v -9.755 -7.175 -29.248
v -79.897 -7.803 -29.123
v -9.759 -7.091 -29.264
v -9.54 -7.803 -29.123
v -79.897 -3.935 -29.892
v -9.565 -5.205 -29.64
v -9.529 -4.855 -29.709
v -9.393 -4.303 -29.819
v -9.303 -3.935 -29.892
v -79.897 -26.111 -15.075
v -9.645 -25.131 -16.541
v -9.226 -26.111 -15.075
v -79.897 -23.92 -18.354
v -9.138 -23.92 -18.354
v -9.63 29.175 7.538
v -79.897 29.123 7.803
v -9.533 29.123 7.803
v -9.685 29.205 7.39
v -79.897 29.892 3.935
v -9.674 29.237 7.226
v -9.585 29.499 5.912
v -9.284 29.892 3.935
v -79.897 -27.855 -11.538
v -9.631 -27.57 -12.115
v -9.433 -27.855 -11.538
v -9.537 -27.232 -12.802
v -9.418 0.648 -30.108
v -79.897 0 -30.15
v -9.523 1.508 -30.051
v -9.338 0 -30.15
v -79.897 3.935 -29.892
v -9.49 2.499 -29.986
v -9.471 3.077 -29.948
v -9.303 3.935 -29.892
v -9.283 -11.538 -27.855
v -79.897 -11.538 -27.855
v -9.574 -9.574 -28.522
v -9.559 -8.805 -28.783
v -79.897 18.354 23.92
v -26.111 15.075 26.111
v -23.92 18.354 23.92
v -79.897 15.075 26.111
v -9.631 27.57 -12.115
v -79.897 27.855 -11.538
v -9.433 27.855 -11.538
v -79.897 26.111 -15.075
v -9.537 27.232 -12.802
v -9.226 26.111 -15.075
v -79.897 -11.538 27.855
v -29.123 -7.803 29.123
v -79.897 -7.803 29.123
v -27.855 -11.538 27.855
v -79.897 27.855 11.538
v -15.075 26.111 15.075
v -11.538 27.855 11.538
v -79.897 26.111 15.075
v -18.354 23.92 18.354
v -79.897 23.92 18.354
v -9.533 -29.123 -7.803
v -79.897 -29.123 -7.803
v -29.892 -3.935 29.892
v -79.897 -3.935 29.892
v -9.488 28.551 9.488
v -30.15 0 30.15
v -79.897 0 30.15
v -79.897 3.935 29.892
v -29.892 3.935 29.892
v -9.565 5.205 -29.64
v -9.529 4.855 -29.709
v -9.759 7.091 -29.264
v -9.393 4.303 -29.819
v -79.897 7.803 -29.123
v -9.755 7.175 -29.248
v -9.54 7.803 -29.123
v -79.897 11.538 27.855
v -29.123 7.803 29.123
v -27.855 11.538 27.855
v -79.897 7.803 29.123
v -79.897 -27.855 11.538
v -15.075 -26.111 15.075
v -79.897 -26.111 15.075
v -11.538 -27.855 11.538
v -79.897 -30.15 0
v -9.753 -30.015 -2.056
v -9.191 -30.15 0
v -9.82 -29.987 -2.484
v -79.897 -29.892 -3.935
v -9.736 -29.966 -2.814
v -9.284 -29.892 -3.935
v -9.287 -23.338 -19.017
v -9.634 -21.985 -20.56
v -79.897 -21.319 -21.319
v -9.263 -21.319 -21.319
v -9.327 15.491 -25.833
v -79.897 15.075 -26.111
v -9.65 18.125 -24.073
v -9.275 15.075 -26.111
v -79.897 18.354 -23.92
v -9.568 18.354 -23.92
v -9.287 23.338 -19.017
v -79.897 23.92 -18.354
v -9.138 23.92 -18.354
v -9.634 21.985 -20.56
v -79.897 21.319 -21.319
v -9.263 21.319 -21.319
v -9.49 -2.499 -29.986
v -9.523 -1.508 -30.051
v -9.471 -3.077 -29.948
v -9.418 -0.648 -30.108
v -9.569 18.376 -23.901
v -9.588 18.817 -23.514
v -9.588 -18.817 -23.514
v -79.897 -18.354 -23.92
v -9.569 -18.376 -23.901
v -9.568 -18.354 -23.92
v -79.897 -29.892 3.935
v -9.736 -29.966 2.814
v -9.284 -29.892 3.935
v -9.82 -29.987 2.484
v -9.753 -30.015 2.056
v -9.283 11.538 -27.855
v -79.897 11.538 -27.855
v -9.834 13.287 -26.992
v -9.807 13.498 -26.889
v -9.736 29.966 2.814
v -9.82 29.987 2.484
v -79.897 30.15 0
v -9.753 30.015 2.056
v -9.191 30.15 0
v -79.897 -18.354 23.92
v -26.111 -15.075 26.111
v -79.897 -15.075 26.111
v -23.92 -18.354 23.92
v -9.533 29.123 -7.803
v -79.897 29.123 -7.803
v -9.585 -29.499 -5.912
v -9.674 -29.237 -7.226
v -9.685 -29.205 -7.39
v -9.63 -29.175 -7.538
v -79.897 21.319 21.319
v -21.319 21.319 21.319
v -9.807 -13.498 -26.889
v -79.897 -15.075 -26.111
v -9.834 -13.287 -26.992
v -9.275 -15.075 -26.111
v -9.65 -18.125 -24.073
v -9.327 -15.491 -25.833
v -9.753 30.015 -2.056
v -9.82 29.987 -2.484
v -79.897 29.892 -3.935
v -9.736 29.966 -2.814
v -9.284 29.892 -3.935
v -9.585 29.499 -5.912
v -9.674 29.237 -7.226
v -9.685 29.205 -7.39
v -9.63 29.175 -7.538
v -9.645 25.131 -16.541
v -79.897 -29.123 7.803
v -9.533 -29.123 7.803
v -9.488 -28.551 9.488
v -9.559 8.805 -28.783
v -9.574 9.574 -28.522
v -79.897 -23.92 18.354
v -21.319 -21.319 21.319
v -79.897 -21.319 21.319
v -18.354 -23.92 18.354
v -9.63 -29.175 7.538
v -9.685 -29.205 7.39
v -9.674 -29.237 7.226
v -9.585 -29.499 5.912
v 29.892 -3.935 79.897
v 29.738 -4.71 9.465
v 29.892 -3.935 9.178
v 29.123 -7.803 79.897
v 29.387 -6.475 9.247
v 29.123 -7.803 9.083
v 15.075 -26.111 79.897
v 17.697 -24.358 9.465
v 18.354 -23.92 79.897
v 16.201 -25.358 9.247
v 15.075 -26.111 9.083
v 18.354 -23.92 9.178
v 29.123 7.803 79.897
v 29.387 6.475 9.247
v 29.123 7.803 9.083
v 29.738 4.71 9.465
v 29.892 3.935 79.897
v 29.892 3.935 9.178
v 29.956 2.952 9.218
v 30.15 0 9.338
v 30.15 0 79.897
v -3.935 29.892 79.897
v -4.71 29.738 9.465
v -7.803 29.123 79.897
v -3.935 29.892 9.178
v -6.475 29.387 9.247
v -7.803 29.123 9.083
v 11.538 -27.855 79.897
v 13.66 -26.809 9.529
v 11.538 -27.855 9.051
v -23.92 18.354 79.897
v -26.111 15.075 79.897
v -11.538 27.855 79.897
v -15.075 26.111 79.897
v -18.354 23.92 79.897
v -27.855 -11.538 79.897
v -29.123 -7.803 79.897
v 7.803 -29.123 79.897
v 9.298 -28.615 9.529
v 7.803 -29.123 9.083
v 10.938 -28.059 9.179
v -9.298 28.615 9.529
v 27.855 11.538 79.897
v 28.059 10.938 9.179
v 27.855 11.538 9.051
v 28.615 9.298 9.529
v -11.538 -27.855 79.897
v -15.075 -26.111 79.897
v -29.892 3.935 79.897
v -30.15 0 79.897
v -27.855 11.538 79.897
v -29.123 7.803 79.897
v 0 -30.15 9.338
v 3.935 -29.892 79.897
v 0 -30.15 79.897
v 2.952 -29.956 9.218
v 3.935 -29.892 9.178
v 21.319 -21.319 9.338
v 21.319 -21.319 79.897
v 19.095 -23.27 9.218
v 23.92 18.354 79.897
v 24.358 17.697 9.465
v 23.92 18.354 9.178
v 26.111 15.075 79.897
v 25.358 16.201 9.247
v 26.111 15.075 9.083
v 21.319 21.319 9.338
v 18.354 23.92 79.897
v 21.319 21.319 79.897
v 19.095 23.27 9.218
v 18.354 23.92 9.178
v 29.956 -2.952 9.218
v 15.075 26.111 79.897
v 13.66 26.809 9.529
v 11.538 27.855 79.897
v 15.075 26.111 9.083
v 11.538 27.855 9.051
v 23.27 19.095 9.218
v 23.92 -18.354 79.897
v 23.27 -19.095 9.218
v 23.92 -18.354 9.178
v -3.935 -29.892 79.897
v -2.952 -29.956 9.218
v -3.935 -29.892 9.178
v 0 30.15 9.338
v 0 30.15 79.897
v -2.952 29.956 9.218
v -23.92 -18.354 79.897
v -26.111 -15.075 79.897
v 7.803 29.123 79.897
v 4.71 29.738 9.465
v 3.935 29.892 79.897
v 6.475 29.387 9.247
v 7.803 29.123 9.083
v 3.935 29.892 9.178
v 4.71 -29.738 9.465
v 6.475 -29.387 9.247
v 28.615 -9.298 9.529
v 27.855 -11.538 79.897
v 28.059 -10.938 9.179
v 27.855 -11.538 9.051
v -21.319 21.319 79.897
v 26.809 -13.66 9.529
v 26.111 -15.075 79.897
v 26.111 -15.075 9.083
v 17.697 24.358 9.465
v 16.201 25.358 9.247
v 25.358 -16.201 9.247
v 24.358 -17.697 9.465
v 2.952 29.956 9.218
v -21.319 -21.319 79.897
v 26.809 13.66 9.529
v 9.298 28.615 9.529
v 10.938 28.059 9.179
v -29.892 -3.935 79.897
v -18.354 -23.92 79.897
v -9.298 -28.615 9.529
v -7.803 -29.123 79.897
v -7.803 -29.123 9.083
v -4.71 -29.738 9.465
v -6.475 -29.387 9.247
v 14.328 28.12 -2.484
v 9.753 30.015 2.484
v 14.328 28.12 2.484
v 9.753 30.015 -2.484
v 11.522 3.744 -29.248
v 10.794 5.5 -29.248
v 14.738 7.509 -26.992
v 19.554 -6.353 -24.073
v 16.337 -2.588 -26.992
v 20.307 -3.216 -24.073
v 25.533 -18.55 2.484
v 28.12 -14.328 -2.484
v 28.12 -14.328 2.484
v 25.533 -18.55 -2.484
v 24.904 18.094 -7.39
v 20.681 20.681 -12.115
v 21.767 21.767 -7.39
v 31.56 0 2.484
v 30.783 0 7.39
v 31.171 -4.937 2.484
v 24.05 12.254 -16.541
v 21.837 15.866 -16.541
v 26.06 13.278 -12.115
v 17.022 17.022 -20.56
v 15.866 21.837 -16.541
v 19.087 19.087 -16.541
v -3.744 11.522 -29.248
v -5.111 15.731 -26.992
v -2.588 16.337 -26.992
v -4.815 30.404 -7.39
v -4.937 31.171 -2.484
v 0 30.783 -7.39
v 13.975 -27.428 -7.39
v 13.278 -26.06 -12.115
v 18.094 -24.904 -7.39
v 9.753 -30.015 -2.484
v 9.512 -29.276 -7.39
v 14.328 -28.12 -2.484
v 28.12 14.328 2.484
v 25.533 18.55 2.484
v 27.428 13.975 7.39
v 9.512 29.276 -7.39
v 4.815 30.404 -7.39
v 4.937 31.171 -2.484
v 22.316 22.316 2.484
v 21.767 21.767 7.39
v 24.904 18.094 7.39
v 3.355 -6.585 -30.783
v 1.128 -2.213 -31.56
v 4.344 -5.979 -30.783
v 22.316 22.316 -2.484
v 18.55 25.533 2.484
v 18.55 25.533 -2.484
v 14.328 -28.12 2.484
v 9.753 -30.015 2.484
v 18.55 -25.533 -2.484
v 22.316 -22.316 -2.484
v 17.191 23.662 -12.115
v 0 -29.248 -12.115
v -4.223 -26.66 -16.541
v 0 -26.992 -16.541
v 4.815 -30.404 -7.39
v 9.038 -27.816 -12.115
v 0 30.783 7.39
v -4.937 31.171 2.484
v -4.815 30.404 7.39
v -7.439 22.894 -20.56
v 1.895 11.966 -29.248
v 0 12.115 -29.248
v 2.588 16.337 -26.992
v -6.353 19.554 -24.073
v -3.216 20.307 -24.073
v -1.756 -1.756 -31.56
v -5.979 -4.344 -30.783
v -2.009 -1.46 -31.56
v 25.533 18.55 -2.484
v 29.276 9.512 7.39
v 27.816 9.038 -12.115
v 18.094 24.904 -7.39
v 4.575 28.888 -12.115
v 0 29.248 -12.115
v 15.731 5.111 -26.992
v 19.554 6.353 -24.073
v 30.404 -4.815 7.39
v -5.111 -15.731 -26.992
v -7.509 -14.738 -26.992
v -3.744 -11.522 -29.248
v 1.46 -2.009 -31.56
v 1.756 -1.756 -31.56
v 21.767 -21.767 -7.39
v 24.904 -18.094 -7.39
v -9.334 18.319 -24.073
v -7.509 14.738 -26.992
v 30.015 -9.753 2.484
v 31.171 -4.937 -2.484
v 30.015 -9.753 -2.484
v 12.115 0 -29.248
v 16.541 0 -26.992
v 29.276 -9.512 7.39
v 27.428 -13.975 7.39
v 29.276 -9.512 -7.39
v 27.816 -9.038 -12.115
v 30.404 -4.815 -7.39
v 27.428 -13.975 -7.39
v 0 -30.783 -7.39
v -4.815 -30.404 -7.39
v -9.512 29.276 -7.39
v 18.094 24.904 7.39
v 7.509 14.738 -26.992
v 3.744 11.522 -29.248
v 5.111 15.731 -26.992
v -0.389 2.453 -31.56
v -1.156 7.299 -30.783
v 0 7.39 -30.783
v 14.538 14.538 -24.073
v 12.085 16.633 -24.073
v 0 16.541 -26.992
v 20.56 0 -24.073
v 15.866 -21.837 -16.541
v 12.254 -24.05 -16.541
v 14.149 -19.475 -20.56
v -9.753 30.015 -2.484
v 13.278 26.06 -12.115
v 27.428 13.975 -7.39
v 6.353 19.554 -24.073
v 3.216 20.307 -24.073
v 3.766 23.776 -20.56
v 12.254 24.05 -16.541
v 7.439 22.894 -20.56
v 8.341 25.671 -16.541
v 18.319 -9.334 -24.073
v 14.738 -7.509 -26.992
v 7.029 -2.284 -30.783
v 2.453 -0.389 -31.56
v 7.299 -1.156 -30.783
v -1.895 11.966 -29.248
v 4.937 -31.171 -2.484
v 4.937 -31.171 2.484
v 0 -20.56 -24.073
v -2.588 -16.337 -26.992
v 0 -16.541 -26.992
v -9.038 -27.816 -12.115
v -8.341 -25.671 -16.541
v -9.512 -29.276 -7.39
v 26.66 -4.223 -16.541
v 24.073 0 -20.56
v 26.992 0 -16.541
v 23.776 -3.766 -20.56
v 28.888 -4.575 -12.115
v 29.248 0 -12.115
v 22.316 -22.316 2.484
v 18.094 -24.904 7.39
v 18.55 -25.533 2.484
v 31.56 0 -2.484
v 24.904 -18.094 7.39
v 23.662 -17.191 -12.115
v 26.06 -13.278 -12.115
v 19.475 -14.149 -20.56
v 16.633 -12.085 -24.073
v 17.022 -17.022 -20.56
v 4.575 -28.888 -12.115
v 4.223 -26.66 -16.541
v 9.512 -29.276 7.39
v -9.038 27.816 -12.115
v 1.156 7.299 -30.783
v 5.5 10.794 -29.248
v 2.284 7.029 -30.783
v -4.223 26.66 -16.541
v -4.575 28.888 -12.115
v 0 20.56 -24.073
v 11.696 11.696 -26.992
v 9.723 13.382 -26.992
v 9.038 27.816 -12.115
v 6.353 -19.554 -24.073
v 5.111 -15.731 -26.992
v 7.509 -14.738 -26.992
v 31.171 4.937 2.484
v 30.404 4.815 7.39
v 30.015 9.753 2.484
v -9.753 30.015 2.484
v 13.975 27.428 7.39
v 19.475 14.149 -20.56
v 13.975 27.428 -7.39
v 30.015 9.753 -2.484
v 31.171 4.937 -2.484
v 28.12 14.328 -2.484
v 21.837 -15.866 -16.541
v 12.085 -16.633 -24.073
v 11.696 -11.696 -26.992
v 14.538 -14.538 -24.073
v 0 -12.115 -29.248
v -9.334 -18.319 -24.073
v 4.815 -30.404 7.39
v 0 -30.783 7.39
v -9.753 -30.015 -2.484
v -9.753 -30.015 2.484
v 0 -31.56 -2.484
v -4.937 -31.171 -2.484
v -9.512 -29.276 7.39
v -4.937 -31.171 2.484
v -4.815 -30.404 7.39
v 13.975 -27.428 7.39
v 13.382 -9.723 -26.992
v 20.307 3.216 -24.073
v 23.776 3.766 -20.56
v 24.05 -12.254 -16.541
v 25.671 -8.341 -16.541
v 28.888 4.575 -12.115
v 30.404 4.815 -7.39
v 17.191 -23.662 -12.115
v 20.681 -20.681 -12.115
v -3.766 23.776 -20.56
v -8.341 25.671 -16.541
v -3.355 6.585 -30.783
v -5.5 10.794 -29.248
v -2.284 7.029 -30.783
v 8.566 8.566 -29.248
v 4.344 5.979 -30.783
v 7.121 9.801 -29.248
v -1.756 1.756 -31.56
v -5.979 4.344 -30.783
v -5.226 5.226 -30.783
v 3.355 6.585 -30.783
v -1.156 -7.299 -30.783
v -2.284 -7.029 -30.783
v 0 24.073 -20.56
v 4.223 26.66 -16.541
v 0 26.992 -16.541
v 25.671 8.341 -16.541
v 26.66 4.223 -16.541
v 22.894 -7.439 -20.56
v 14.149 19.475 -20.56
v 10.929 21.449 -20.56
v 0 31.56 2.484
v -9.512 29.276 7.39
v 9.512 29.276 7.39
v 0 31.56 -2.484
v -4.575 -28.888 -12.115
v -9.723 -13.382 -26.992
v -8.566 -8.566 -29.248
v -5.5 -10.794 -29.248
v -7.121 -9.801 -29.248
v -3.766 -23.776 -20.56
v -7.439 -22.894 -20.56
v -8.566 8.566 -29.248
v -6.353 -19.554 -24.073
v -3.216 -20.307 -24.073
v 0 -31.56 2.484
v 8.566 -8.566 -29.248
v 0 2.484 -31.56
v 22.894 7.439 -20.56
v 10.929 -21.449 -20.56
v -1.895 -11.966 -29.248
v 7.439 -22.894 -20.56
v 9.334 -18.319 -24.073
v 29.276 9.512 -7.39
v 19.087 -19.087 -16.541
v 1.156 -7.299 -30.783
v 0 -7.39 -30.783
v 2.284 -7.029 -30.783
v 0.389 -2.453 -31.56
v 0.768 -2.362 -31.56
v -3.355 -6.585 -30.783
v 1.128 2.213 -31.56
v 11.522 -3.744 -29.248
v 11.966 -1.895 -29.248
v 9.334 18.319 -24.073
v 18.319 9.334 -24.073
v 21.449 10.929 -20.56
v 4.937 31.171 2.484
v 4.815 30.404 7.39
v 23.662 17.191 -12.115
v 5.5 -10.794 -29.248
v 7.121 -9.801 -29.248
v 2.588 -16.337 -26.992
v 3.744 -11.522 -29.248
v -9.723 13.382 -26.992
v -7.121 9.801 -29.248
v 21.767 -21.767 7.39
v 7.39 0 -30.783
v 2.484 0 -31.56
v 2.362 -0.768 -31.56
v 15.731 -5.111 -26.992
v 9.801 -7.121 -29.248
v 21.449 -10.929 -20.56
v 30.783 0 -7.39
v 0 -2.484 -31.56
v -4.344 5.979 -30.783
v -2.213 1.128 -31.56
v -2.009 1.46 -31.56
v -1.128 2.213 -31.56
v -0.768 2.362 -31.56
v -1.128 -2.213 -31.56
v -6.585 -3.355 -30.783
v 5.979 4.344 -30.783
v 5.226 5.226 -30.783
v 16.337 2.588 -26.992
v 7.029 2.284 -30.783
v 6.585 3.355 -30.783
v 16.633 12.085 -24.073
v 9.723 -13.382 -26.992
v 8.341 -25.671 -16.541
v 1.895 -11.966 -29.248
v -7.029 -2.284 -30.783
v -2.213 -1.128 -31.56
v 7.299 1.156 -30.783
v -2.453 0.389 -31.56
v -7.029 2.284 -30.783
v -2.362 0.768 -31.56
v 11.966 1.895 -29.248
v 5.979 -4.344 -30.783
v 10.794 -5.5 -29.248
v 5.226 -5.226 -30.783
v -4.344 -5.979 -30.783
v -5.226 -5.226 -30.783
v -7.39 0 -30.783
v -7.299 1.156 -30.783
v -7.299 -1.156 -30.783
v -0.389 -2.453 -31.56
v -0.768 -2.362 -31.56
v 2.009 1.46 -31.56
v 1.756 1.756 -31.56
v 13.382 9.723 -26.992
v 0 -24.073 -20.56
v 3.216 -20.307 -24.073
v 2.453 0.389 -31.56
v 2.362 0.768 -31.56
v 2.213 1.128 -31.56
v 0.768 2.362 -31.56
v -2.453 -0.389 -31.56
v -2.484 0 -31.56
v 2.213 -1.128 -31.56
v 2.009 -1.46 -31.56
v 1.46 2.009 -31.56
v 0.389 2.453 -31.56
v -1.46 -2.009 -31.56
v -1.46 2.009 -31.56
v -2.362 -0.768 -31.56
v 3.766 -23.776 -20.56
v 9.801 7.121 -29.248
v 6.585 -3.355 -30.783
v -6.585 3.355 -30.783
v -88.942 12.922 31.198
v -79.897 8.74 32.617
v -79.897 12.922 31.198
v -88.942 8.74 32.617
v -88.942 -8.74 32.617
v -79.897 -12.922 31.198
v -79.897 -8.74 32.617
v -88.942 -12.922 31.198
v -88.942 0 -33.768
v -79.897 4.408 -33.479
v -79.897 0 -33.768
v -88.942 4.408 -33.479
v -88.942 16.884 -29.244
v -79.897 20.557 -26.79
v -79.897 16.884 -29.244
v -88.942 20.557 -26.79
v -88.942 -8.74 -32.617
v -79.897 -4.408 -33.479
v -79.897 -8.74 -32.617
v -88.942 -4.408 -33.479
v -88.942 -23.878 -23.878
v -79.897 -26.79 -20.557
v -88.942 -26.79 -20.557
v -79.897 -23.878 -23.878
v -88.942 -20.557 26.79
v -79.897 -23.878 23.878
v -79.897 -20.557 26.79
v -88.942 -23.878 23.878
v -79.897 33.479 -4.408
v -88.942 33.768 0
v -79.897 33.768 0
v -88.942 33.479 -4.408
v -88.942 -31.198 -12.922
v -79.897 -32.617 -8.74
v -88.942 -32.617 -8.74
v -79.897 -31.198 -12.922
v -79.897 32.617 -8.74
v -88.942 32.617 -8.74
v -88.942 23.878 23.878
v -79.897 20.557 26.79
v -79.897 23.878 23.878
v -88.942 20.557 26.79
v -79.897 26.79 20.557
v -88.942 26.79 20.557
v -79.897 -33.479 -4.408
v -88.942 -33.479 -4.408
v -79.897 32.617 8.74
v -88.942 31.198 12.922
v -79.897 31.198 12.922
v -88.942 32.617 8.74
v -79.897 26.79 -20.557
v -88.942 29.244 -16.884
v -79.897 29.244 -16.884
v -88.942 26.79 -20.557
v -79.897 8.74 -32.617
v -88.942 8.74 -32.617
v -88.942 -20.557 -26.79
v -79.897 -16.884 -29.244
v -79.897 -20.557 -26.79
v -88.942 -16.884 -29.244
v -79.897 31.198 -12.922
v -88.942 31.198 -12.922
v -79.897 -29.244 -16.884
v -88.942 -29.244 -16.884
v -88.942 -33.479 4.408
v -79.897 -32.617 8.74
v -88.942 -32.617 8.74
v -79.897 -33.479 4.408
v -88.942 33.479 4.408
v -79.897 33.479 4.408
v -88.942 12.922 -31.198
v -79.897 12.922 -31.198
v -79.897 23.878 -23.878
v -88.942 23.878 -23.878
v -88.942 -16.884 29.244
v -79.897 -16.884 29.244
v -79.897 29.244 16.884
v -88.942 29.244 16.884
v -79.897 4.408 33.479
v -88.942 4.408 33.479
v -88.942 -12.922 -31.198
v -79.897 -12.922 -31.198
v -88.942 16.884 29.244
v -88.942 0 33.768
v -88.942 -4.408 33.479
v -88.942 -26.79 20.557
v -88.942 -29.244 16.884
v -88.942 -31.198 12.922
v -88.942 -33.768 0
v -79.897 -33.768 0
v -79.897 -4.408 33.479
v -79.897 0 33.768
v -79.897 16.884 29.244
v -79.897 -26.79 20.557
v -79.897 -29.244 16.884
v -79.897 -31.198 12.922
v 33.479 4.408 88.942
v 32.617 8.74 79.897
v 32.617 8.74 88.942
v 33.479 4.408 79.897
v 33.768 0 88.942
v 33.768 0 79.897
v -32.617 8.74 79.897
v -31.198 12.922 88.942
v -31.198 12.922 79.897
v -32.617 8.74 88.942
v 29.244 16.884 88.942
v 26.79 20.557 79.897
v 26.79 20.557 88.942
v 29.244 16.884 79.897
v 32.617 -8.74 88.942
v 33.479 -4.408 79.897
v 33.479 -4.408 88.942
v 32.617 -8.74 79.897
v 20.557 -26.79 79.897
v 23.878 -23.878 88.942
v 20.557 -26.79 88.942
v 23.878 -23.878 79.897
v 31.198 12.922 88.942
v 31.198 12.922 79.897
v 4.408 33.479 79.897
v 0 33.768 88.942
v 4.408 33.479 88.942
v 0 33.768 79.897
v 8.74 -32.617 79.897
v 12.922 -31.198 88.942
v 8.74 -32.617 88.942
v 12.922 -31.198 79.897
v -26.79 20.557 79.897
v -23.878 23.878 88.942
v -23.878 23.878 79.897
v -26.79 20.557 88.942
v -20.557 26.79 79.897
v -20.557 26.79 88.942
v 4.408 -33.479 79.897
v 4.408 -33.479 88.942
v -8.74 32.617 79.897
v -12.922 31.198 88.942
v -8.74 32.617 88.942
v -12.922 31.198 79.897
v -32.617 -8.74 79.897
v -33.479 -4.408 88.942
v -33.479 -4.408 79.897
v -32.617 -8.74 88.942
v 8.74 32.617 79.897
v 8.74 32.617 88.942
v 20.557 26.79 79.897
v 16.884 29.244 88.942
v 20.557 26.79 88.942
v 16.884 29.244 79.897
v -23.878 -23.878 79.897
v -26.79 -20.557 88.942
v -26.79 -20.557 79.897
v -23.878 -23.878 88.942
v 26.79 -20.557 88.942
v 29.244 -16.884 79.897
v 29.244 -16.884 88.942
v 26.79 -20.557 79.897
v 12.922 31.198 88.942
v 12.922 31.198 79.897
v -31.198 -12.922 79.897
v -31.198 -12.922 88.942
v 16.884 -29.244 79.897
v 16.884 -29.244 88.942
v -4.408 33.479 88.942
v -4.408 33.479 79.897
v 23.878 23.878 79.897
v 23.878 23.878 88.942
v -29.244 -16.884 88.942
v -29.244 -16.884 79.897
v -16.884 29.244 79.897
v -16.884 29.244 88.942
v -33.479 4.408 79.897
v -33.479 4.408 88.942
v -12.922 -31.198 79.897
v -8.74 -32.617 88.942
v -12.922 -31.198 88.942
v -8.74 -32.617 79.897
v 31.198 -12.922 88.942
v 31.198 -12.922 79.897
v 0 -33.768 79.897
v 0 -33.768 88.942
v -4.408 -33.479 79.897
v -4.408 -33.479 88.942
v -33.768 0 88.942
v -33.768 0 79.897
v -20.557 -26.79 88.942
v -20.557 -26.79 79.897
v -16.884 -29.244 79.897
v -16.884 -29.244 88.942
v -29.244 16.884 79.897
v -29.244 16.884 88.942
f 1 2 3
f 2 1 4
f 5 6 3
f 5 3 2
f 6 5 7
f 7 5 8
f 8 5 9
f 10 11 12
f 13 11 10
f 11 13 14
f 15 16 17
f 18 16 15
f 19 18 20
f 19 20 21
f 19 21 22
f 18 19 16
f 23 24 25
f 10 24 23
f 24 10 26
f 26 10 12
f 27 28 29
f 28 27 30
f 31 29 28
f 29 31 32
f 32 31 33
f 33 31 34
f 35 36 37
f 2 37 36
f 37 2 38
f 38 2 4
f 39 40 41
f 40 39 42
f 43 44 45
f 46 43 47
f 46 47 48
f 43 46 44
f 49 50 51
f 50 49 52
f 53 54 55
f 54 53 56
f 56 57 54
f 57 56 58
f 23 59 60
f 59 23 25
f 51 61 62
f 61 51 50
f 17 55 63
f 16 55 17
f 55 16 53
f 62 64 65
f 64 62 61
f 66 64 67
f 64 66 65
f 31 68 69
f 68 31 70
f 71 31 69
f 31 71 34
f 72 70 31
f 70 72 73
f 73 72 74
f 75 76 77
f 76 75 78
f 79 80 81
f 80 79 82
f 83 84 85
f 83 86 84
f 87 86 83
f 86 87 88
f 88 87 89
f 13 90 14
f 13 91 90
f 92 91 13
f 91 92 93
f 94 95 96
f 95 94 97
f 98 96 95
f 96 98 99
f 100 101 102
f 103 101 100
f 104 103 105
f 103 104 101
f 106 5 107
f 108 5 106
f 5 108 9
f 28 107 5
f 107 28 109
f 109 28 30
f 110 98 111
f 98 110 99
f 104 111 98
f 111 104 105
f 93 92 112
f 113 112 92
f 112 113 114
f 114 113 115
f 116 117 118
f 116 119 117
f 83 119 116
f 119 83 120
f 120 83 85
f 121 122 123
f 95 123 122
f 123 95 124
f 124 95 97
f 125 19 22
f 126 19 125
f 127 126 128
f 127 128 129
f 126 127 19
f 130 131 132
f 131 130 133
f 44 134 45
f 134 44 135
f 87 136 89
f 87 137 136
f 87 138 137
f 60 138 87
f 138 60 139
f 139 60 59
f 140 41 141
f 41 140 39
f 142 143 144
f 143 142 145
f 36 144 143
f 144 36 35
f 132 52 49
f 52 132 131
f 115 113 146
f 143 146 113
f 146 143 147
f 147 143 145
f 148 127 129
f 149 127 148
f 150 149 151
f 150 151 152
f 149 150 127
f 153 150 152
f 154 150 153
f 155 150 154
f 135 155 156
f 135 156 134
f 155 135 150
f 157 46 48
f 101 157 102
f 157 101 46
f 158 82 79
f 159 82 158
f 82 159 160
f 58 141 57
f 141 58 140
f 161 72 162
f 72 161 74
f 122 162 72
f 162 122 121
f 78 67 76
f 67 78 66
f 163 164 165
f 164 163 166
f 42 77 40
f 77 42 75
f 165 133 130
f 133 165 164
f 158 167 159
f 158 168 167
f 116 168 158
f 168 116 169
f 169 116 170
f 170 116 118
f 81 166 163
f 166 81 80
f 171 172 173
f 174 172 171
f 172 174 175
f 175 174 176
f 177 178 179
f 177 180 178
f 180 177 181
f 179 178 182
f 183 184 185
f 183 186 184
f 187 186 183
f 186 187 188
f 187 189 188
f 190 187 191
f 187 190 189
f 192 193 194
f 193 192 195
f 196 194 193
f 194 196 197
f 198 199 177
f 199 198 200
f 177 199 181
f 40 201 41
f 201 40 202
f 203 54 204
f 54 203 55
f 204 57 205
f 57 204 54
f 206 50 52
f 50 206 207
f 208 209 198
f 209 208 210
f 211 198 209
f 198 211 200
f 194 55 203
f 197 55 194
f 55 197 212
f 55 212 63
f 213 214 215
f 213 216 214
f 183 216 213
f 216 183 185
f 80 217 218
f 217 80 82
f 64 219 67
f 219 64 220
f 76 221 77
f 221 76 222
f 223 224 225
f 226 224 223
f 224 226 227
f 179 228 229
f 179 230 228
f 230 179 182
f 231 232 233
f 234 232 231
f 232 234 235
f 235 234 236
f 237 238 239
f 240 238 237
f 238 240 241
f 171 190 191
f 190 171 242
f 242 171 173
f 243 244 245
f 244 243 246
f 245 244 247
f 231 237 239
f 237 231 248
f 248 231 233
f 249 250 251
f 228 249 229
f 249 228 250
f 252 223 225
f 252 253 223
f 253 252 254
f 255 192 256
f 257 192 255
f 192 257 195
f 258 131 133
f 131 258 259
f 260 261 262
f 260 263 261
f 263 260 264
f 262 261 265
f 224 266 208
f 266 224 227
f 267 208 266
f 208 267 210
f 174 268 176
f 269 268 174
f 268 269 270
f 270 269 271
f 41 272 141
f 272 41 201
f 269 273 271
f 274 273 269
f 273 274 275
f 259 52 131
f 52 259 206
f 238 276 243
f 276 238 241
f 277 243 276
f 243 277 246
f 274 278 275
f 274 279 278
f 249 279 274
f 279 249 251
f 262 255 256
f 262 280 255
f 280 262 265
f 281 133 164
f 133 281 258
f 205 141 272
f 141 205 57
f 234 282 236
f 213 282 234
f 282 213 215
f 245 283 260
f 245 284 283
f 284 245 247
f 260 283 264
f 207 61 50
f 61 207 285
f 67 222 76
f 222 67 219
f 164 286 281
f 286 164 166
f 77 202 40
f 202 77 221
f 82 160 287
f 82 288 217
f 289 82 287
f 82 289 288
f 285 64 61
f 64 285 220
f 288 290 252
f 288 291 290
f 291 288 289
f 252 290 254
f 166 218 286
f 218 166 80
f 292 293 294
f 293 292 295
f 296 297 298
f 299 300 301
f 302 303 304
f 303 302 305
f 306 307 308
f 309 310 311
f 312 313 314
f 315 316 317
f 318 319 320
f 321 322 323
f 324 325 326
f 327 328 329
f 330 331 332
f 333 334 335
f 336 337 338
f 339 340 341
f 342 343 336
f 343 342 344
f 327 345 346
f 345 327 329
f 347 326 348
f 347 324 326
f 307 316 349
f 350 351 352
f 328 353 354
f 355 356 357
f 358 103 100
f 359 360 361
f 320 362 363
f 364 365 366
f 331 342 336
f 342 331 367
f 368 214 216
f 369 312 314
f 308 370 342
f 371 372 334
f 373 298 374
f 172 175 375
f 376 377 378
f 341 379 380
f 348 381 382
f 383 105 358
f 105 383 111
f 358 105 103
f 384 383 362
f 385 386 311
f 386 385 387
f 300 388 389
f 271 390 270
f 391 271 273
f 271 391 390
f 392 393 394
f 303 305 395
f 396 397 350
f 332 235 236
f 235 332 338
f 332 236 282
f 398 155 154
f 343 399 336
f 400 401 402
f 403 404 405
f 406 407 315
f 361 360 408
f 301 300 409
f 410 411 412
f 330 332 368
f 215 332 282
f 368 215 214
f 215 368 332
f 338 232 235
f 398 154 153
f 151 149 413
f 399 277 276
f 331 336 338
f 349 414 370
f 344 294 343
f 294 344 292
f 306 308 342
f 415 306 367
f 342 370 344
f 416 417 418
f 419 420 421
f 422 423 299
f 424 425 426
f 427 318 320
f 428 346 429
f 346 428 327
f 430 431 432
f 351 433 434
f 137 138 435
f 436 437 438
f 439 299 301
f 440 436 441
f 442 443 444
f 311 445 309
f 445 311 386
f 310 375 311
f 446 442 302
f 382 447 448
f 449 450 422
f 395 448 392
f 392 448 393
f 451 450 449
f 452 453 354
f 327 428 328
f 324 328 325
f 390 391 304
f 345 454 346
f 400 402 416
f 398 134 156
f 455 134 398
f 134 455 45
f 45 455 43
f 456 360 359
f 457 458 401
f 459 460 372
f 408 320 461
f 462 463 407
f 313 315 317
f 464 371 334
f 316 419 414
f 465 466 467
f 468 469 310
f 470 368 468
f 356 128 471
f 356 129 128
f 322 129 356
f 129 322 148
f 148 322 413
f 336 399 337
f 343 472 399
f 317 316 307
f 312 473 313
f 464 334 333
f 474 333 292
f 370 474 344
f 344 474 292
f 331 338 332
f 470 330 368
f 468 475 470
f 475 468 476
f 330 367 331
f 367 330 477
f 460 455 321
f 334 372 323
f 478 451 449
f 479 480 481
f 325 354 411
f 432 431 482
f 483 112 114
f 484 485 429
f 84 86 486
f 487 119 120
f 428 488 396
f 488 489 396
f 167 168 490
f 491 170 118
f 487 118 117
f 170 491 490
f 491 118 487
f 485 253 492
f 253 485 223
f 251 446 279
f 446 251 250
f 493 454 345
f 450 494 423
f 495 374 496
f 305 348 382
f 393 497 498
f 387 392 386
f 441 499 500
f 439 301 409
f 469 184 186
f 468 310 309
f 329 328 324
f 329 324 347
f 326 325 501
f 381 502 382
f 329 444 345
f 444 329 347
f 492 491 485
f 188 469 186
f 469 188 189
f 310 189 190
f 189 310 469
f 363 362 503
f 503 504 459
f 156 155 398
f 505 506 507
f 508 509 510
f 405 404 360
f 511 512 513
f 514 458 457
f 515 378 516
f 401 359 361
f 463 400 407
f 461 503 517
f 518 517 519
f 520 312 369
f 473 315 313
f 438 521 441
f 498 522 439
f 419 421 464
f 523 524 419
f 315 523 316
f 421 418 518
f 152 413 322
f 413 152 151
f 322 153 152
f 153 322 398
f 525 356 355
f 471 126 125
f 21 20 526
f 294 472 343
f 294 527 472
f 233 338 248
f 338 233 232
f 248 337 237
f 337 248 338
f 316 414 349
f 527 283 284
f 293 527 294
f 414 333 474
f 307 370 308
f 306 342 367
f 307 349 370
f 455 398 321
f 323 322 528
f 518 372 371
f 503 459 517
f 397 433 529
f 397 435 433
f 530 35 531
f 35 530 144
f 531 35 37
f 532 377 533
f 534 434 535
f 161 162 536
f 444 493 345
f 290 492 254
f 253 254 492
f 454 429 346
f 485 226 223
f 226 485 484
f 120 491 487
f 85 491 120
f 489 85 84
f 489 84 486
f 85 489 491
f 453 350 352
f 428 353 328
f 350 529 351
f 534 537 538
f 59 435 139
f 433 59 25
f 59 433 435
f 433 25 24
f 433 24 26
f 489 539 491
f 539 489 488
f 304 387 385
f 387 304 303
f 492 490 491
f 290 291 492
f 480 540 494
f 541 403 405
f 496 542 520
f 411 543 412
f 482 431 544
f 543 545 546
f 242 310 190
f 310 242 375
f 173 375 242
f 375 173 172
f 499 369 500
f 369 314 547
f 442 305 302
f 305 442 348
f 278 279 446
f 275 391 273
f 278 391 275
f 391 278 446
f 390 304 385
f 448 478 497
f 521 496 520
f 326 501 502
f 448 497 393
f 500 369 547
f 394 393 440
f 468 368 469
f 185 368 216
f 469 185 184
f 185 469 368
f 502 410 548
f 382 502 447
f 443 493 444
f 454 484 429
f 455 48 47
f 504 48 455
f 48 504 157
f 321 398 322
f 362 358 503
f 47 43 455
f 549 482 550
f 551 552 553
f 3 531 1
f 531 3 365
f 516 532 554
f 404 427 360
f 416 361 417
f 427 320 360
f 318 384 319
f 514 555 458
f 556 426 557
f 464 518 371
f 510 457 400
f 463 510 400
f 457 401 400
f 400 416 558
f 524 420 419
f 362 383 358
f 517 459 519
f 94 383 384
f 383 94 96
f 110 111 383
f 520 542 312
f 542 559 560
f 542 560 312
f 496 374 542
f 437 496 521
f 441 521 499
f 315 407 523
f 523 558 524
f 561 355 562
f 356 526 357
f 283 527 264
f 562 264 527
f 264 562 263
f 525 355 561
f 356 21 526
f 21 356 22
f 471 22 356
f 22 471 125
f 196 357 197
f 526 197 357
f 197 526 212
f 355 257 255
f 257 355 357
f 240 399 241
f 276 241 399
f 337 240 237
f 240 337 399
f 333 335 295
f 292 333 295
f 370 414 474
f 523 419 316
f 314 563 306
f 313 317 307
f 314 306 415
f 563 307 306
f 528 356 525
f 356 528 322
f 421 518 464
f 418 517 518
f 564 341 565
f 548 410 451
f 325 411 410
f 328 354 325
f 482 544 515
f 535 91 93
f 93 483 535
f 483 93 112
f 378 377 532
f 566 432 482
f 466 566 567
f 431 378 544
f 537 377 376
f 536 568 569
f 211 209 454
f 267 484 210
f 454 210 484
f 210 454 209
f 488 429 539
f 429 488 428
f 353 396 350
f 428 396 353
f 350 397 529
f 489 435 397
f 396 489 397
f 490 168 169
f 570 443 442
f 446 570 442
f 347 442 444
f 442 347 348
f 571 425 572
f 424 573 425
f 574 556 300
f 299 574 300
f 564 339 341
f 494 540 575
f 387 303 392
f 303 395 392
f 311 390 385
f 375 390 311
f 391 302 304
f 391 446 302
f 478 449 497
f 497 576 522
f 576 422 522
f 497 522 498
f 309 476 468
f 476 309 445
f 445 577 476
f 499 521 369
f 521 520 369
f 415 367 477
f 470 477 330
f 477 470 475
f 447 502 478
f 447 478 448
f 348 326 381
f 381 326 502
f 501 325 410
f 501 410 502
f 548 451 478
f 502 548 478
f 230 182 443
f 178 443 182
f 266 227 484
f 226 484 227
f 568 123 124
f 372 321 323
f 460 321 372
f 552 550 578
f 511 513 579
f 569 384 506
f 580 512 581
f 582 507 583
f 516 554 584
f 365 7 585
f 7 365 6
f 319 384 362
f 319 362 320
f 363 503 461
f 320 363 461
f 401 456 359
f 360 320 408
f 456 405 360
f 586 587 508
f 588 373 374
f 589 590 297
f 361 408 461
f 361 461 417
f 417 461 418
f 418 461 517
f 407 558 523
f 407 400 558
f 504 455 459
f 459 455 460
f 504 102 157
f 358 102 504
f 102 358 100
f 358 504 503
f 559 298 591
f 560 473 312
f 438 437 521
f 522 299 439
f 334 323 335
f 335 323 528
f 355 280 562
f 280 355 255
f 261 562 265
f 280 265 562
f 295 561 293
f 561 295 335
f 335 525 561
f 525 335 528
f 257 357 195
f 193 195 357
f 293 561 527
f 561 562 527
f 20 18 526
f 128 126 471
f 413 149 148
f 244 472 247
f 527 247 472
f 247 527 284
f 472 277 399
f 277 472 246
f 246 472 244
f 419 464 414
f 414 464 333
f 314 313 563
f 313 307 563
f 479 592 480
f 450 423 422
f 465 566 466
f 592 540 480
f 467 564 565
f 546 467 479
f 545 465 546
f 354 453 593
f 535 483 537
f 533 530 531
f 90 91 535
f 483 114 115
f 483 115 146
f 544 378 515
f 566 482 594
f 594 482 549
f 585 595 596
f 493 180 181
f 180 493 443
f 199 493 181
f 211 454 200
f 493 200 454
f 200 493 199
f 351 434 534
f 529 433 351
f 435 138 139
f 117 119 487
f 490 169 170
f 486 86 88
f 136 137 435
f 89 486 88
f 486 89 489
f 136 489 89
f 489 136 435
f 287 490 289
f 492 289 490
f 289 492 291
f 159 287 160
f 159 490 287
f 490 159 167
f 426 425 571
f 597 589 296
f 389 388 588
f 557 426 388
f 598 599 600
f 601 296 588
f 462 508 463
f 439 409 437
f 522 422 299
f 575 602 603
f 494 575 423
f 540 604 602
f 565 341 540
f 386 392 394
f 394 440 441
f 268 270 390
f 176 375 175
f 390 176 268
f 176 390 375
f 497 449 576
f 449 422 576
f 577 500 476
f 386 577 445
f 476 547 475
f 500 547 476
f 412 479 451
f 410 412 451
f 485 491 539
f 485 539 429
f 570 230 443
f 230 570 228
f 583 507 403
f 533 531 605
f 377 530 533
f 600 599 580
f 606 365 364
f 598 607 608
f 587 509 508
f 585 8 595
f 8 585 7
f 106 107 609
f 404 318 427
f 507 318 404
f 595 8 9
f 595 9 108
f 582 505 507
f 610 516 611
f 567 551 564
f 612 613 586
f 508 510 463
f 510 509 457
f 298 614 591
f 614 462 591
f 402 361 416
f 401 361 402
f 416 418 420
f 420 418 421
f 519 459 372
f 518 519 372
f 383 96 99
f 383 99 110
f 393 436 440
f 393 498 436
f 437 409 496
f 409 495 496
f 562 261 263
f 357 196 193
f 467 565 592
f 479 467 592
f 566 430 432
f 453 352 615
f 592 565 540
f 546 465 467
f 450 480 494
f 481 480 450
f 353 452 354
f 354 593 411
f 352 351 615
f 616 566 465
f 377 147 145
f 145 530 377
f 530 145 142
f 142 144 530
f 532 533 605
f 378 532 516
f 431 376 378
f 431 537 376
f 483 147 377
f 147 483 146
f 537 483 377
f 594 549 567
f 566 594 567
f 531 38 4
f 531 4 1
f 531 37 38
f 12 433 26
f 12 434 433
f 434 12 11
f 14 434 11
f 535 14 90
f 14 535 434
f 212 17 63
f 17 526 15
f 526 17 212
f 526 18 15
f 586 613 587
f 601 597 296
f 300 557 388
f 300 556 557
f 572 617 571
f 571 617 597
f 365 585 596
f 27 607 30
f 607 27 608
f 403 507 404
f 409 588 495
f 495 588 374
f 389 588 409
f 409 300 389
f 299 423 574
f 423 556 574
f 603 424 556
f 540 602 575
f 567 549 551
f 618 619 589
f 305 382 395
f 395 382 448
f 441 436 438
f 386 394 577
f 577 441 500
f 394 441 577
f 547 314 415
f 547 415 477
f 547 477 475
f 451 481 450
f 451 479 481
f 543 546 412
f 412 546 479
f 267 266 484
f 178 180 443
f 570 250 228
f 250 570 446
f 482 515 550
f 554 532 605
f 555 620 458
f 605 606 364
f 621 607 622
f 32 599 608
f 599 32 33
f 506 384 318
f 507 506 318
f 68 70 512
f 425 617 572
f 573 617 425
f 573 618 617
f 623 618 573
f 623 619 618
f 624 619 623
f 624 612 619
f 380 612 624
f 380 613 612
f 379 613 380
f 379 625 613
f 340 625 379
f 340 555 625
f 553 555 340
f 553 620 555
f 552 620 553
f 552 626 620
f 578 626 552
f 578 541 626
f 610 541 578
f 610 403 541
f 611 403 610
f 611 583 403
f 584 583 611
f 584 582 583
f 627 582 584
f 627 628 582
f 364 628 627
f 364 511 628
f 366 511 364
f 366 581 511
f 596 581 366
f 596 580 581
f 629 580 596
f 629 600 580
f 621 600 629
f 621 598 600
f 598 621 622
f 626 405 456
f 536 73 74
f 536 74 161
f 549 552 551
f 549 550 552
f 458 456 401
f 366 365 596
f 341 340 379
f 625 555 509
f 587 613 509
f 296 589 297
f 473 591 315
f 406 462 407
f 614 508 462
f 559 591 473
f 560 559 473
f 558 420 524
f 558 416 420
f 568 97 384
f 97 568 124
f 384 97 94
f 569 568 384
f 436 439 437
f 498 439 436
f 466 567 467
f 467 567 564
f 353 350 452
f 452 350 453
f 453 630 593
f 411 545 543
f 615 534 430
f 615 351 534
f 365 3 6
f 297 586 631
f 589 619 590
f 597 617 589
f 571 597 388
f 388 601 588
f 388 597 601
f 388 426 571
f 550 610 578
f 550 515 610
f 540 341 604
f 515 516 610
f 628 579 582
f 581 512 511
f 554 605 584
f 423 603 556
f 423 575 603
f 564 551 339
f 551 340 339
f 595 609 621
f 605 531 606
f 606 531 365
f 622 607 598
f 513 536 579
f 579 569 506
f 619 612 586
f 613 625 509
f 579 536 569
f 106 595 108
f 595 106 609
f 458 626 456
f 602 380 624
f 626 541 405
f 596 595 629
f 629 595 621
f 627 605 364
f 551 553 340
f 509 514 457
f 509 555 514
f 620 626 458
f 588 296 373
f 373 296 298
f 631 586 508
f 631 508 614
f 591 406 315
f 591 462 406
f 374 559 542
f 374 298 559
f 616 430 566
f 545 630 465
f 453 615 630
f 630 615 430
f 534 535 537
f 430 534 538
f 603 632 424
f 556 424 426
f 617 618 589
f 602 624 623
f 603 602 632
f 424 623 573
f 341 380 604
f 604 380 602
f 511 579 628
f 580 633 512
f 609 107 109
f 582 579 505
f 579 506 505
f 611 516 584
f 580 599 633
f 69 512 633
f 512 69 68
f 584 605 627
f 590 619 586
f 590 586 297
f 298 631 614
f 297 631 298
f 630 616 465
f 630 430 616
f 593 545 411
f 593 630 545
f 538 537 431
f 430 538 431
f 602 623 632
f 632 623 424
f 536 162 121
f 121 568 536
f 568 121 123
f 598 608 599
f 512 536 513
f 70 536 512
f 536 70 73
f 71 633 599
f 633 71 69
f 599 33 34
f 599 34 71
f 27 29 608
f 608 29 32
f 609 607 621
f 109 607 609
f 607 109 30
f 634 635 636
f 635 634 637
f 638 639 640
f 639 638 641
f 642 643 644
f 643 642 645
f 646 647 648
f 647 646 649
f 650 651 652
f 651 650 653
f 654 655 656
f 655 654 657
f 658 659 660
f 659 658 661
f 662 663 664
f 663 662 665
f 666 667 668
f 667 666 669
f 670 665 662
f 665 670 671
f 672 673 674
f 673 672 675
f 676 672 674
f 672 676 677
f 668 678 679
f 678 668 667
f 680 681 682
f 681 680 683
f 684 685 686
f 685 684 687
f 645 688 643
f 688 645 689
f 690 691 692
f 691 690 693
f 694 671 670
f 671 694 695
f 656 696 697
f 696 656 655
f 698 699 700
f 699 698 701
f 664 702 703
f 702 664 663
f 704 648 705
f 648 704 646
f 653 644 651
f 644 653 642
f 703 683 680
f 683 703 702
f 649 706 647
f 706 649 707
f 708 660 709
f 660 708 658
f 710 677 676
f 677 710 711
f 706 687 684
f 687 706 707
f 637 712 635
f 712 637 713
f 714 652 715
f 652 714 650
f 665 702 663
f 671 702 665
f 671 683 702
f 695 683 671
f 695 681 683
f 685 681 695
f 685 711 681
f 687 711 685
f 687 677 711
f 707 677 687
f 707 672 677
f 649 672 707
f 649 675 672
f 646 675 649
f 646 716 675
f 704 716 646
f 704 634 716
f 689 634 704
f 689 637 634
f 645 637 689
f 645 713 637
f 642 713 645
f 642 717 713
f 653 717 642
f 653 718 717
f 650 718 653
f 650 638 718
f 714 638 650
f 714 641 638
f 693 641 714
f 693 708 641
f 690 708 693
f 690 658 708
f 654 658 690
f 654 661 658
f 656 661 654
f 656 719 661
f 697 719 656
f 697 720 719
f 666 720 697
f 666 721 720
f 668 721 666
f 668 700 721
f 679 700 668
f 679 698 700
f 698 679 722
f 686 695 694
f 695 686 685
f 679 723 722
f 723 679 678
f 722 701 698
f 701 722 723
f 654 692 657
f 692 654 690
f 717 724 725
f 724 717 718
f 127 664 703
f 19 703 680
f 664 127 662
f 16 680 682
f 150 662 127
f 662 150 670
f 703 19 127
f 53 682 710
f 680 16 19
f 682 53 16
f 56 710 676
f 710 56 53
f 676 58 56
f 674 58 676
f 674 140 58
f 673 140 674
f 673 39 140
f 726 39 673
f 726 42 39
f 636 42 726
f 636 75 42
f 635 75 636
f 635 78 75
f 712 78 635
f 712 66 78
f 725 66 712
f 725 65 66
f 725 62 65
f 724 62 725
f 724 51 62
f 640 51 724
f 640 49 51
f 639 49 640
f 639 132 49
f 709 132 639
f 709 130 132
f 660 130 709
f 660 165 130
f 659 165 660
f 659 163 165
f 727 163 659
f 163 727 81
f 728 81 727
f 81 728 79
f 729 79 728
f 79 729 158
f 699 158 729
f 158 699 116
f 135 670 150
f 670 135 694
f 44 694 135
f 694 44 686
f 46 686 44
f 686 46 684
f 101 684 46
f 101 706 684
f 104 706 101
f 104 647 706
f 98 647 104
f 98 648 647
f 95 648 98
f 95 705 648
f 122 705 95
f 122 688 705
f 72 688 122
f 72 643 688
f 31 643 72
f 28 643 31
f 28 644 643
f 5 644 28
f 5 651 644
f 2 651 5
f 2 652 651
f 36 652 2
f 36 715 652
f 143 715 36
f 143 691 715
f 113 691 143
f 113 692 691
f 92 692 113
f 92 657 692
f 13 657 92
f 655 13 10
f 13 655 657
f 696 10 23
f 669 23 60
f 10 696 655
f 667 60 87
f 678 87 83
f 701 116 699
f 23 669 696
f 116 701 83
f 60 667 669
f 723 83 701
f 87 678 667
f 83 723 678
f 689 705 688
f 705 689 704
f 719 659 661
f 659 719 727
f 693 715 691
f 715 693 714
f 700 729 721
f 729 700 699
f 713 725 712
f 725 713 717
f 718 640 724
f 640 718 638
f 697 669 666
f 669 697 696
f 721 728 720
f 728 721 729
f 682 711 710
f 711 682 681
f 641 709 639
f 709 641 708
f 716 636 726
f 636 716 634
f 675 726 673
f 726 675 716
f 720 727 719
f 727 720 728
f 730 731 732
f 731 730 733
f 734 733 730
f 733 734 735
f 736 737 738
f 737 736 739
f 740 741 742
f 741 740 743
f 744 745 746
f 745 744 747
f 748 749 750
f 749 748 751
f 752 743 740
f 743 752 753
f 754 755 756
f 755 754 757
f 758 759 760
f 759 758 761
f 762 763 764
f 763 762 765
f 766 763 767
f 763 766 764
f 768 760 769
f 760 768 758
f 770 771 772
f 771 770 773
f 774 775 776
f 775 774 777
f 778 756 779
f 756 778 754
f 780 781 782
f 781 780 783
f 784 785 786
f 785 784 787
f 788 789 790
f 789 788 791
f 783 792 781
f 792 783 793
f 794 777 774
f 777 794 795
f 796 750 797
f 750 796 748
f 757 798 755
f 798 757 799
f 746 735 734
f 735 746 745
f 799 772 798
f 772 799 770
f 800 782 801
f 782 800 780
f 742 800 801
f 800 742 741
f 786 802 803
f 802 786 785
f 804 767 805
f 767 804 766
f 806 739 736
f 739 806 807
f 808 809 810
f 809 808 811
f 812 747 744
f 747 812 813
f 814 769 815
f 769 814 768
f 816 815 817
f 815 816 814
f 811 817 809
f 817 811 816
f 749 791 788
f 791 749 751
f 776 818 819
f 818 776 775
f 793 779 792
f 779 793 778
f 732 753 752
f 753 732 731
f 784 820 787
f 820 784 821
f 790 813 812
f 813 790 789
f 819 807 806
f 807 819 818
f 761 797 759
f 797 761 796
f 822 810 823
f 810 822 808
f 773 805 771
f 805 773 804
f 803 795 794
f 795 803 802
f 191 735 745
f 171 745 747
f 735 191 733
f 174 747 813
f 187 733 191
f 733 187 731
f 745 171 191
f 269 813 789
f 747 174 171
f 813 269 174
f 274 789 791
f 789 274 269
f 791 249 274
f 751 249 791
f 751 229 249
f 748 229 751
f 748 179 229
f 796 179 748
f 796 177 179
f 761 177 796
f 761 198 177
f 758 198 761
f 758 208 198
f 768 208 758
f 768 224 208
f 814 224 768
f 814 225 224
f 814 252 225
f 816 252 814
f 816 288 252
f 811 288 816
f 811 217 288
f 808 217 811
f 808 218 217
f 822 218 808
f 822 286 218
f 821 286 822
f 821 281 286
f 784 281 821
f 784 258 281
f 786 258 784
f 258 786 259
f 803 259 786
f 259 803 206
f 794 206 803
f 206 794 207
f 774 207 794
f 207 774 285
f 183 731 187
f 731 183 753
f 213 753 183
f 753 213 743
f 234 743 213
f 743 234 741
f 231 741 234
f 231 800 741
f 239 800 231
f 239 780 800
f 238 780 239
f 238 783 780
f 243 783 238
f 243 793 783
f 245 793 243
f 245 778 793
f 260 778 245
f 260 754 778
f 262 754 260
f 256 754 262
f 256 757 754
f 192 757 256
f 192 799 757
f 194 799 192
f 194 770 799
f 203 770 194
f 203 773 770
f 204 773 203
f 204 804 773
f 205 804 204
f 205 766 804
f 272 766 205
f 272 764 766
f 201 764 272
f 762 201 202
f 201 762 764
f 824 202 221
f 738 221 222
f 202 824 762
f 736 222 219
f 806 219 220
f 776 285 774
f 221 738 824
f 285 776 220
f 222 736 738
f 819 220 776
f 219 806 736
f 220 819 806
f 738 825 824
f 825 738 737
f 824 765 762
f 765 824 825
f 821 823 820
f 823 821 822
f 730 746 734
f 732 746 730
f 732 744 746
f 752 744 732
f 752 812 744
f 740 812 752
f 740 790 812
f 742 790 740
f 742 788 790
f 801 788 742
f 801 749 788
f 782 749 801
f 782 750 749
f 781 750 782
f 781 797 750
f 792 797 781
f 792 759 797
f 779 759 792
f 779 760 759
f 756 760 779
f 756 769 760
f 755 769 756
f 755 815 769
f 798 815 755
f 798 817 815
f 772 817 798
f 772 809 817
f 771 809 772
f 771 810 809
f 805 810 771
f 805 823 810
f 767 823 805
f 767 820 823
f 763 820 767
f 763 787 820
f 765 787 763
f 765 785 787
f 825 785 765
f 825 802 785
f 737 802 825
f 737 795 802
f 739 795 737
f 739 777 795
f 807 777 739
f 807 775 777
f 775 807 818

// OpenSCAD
// 90° elbow (grooved). Inlet face at -X, outlet face at +Z.
//
// Params:
//   size_in      nominal pipe size in inches
//
// Connector convention matches connectorsFor():
//   inlet:  position (-L/2, 0, 0), direction (-1, 0, 0)
//   outlet: position (0, 0, L/2), direction (0, 0, 1)

// @part elbow_90
// @kind fitting
// @category fitting.elbow90.grooved
// @display-name "90° Grooved Elbow (2\")"
// @mfg victaulic
// @mfg-pn Style-10
// @price-usd 9.20
// @install-minutes 6
// @crew journeyman
// @param size_in enum[1,1.25,1.5,2,2.5,3,4] default=2 label="Size" unit="in"
// @port in  position=[-0.05,0,0] direction=[-1,0,0] style=grooved size_in=2 role=run_a
// @port out position=[0,0,0.05]  direction=[0,0,1]  style=grooved size_in=2 role=run_b

size_in = 2;

function od_mm(nps) =
    nps ==   1  ? 33.4 :
    nps == 1.25 ? 42.2 :
    nps == 1.5  ? 48.3 :
    nps ==   2  ? 60.3 :
    nps == 2.5  ? 73.0 :
    nps ==   3  ? 88.9 :
    nps ==   4  ? 114.3 :
    nps ==   5  ? 141.3 :
    nps ==   6  ? 168.3 :
    nps ==   8  ? 219.1 :
    nps ==  10  ? 273.0 : 60.3;

od     = od_mm(size_in);
leg_mm = od * 1.4;          // leg length proportional to OD
groove = od * 0.15;         // flared groove at each face

union() {
    // Inlet leg along X, groove on the -X face
    translate([-leg_mm/2, 0, 0])
        rotate([0, 90, 0])
        cylinder(h = leg_mm, d = od, center = true, $fn = 48);
    // Outlet leg along Z
    translate([0, 0, leg_mm/2])
        cylinder(h = leg_mm, d = od, center = true, $fn = 48);
    // Elbow hub
    sphere(d = od * 1.05, $fn = 40);
    // Coupling flares
    translate([-leg_mm, 0, 0])
        rotate([0, 90, 0])
        cylinder(h = groove, d = od * 1.12, center = true, $fn = 48);
    translate([0, 0, leg_mm])
        cylinder(h = groove, d = od * 1.12, center = true, $fn = 48);
}
